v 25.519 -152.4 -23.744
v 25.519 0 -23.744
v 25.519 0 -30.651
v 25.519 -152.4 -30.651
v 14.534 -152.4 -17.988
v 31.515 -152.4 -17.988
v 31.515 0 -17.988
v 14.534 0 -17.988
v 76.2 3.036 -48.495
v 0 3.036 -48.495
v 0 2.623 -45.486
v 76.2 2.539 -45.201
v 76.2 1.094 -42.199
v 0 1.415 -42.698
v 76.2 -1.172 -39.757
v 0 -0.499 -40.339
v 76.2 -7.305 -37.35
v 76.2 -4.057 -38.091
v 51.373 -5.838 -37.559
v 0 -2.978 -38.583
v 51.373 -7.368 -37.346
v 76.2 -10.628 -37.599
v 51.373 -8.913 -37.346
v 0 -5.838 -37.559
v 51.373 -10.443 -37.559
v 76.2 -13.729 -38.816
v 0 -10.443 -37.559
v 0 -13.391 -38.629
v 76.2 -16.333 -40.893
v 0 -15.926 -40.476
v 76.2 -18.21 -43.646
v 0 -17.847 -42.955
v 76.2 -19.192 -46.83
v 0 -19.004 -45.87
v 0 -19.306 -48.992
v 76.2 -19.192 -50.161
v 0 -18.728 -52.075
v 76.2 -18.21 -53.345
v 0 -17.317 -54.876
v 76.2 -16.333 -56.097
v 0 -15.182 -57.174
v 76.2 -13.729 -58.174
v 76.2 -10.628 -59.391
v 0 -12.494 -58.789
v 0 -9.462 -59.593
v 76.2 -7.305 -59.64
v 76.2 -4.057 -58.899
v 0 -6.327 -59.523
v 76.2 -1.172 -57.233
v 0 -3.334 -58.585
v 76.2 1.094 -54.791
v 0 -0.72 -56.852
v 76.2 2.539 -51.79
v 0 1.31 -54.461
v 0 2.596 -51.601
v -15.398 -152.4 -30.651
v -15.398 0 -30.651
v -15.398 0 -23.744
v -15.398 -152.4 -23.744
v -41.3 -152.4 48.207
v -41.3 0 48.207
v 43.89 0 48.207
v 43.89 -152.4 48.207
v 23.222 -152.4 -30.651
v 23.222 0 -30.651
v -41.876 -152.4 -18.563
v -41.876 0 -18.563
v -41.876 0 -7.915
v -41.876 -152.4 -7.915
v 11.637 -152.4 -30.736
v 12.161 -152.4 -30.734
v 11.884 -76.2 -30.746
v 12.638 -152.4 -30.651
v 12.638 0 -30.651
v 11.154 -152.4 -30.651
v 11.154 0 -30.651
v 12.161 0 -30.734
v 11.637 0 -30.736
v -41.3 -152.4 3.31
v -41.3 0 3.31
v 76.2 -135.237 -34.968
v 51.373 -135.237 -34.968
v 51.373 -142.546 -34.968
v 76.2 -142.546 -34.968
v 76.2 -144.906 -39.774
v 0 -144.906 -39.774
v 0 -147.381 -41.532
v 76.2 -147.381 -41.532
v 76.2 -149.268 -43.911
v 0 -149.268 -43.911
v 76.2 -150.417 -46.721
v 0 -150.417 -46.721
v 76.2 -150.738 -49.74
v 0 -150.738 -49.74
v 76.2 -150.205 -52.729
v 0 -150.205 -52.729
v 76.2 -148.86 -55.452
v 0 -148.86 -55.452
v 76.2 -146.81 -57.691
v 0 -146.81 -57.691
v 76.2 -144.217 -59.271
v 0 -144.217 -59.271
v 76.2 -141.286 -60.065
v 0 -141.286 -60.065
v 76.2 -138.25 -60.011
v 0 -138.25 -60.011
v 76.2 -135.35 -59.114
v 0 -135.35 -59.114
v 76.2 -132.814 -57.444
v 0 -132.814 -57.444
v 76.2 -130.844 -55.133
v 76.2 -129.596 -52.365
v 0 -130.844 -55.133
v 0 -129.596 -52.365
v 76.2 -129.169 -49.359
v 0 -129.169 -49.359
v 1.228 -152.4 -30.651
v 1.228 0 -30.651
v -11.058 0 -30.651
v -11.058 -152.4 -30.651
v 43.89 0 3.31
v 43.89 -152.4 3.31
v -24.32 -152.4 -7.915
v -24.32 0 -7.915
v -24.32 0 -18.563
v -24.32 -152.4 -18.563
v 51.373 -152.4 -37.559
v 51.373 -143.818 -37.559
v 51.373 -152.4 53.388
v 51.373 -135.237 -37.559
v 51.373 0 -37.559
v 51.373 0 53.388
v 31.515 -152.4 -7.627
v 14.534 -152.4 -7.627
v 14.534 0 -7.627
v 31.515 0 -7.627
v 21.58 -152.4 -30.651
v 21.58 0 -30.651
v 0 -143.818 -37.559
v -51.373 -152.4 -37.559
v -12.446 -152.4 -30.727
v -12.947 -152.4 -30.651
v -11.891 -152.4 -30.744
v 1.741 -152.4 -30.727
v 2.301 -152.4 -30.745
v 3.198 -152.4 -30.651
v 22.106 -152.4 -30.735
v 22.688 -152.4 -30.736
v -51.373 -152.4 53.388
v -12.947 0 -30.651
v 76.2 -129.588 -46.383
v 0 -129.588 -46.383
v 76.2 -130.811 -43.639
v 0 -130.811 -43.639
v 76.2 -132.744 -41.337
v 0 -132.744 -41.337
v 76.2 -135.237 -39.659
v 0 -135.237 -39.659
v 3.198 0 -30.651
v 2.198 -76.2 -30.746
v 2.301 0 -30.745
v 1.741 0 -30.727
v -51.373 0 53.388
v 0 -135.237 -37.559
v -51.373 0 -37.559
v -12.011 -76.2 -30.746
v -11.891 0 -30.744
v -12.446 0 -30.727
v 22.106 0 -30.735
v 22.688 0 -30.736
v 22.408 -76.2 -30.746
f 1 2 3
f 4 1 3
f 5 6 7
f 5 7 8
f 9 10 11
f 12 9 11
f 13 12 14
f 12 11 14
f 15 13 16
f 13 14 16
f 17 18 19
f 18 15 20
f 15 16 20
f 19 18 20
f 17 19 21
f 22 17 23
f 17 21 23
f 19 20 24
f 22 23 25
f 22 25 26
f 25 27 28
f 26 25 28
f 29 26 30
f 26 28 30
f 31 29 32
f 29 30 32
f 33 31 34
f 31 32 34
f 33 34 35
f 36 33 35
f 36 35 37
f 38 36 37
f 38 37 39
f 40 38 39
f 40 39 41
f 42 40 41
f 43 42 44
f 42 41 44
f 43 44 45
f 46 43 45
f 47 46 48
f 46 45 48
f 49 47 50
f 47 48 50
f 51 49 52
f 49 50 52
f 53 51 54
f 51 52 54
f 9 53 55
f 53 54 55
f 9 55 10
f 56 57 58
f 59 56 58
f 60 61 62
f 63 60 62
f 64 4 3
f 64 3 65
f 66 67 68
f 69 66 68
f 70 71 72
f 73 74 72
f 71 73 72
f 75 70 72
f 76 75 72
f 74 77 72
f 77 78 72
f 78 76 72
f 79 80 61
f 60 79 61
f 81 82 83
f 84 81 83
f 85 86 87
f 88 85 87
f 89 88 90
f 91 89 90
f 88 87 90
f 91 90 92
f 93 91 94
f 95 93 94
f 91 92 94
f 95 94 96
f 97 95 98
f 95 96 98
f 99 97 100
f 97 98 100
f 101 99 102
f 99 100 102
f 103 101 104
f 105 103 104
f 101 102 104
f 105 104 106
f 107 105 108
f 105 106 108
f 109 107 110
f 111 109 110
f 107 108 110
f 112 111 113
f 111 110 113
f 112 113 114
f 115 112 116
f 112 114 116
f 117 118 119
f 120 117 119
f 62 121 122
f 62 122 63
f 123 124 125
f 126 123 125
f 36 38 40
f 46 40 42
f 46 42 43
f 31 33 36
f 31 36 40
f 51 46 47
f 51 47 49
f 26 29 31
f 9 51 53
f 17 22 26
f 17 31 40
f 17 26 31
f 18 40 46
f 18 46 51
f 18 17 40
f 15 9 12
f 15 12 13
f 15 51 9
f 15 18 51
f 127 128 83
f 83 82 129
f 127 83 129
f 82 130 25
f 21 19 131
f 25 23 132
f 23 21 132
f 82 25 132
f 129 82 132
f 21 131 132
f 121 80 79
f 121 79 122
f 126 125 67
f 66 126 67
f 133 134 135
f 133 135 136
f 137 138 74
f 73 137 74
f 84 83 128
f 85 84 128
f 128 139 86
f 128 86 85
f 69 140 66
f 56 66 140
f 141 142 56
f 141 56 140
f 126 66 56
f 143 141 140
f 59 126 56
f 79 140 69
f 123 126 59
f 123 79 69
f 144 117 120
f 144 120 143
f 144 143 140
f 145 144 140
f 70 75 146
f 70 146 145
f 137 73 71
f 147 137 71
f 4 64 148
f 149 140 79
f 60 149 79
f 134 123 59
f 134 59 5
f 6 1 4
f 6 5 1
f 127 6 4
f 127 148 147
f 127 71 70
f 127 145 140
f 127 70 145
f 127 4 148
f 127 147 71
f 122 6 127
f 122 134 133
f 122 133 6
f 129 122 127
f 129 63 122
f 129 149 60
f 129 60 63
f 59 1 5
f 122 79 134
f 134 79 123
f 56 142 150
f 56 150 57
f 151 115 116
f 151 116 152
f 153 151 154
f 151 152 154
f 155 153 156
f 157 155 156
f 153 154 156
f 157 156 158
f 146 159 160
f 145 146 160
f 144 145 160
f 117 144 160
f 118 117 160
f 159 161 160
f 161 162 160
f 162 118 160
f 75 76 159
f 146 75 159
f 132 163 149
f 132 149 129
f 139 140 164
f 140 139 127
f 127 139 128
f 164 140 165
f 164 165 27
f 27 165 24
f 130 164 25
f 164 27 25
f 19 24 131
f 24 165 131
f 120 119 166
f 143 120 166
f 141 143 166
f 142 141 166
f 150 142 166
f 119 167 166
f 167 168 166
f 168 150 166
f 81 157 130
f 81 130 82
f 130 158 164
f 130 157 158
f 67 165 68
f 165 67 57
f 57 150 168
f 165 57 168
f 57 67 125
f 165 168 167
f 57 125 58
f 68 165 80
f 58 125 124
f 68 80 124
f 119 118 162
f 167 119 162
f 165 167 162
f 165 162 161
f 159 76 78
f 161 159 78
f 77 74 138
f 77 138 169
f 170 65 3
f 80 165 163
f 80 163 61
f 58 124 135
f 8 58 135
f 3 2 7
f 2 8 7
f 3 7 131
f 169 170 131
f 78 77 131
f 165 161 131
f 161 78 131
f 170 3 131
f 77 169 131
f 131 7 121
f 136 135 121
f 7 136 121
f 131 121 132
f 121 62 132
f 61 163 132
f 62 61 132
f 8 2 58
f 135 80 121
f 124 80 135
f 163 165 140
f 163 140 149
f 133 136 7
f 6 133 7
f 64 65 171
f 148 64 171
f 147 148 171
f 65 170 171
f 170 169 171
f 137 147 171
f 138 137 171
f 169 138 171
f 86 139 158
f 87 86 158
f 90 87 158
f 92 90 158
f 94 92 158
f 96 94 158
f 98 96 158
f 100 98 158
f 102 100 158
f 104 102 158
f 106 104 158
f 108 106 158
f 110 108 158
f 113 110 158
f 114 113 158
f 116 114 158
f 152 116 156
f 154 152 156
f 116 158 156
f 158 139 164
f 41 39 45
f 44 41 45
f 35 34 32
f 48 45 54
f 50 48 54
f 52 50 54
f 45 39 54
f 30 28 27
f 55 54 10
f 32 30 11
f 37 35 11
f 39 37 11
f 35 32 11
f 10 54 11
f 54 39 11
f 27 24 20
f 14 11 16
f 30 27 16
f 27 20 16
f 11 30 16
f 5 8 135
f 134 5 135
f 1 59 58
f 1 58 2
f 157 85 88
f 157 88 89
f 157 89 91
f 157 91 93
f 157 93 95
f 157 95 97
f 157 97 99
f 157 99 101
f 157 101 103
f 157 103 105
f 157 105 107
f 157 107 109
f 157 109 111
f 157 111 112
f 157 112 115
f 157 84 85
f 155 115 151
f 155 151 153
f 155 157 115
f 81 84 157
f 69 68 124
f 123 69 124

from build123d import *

# Parameters (mm, degrees)
F0_W     = 102.7466543019
F0_H     = 90.9466221929
F0_W_2   = 85.1905047894
F0_H_2   = 44.8976957705
F1_DEPTH = 152.4
F2_R     = 11.1763524663
F3_DEPTH = 76.2


with BuildPart() as f1:
    # F0 (on Front) → F1 (new body)
    with BuildSketch(Plane.XZ):
        with Locations((-1.8626e-06, 7.9146586359)):
            Rectangle(F0_W, F0_H)
        Polygon((-41.8757386506, -12.8073554952), (-41.8757386506, -7.9146586359), (-37.270847708, -7.9146586359), (-24.3195872754, -7.9146586359), (-24.3195872754, -18.5634717345), (-37.270847708, -18.5634717345), (-41.8757386506, -18.5634717345), align=None, mode=Mode.SUBTRACT)
        with BuildLine():
            Line((-15.3976082802, -30.6513141841), (-15.3976082802, -23.7439740449))
            Line((-15.3976082802, -23.7439740449), (25.5187885163, -23.7439740449))
            Line((25.5187885163, -23.7439740449), (25.5187885163, -30.6513141841))
            Line((25.5187885163, -30.6513141841), (23.2219085714, -30.6513141841))
            add(Edge.make_bspline(
                [(23.2219085714, -30.6513141841), (22.85194256, -30.745750475), (22.4083868695, -30.745750475)],
                knots=[0.6101406025, 0.6101406025, 0.6101406025, 1, 1, 1], degree=2))
            add(Edge.make_bspline(
                [(22.4083868695, -30.745750475), (21.9525027452, -30.745750475), (21.5799819799, -30.6513141841)],
                knots=[0, 0, 0, 0.4594075276, 0.4594075276, 0.4594075276], degree=2))
            Line((21.5799819799, -30.6513141841), (17.1949040127, -30.6513141841))
            Line((17.1949040127, -30.6513141841), (15.8233293106, -30.6513141841))
            Line((15.8233293106, -30.6513141841), (12.6383256981, -30.6513141841))
            add(Edge.make_bspline(
                [(12.6383256981, -30.6513141841), (12.2965846392, -30.745750475), (11.8839868875, -30.745750475)],
                knots=[0.6033851102, 0.6033851102, 0.6033851102, 1, 1, 1], degree=2))
            add(Edge.make_bspline(
                [(11.8839868875, -30.745750475), (11.4876624367, -30.745750475), (11.1537473039, -30.6513141841)],
                knots=[0, 0, 0, 0.3398387497, 0.3398387497, 0.3398387497], degree=2))
            Line((11.1537473039, -30.6513141841), (3.1983305145, -30.6513141841))
            add(Edge.make_bspline(
                [(3.1983305145, -30.6513141841), (2.7104556951, -30.745750475), (2.1975216142, -30.745750475)],
                knots=[0.4435987872, 0.4435987872, 0.4435987872, 1, 1, 1], degree=2))
            add(Edge.make_bspline(
                [(2.1975216142, -30.745750475), (1.6733949816, -30.745750475), (1.2280841955, -30.6513141841)],
                knots=[0, 0, 0, 0.325259052, 0.325259052, 0.325259052], degree=2))
            Line((1.2280841955, -30.6513141841), (-2.1870204663, -30.6513141841))
            Line((-2.1870204663, -30.6513141841), (-3.5690880896, -30.6513141841))
            Line((-3.5690880896, -30.6513141841), (-6.4456474922, -30.6513141841))
            Line((-6.4456474922, -30.6513141841), (-7.8277151155, -30.6513141841))
            Line((-7.8277151155, -30.6513141841), (-11.0580714674, -30.6513141841))
            add(Edge.make_bspline(
                [(-11.0580714674, -30.6513141841), (-11.4916109594, -30.745750475), (-12.0113927042, -30.745750475)],
                knots=[0.6303252294, 0.6303252294, 0.6303252294, 1, 1, 1], degree=2))
            add(Edge.make_bspline(
                [(-12.0113927042, -30.745750475), (-12.5246569888, -30.745750475), (-12.9473134807, -30.6513141841)],
                knots=[0, 0, 0, 0.3766854018, 0.3766854018, 0.3766854018], degree=2))
            Line((-12.9473134807, -30.6513141841), (-15.3976082802, -30.6513141841))
        make_face(mode=Mode.SUBTRACT)
        Polygon((14.5341921598, -17.9878585041), (14.5341921598, -7.6268524863), (26.0464195162, -7.6268524863), (31.5147265792, -7.6268524863), (31.5147265792, -12.8073554952), (31.5147265792, -17.9878585041), (26.0464195162, -17.9878585041), align=None, mode=Mode.SUBTRACT)
        with Locations((1.2951269746, 25.7586139487)):
            Rectangle(F0_W_2, F0_H_2, mode=Mode.SUBTRACT)
    extrude(amount=F1_DEPTH)

    # F2 (on Right) → F3 (join)
    with BuildSketch(Plane.YZ):
        with Locations((-8.1405537203, -48.4952703118)):
            Circle(F2_R)
        with BuildLine():
            ThreePointArc((-144.905696857, -39.7735155561), (-145.56909186, -58.572575633), (-129.1690343005, -49.3593859167))
            ThreePointArc((-129.1690343005, -49.3593859167), (-130.8108710033, -43.6385160791), (-135.2366314328, -39.6589904693))
            ThreePointArc((-135.2366314328, -39.6589904693), (-140.084714499, -38.57223065), (-144.905696857, -39.7735155561))
        make_face()
        with BuildLine():
            ThreePointArc((-144.905696857, -39.7735155561), (-140.084714499, -38.57223065), (-135.2366314328, -39.6589904693))
            Line((-135.2366314328, -39.6589904693), (-135.2366314328, -34.9684022367))
            Line((-135.2366314328, -34.9684022367), (-142.5458490849, -34.9684022367))
            Line((-142.5458490849, -34.9684022367), (-144.905696857, -39.7735155561))
        make_face()
    extrude(amount=F3_DEPTH)


solid = f1.part
